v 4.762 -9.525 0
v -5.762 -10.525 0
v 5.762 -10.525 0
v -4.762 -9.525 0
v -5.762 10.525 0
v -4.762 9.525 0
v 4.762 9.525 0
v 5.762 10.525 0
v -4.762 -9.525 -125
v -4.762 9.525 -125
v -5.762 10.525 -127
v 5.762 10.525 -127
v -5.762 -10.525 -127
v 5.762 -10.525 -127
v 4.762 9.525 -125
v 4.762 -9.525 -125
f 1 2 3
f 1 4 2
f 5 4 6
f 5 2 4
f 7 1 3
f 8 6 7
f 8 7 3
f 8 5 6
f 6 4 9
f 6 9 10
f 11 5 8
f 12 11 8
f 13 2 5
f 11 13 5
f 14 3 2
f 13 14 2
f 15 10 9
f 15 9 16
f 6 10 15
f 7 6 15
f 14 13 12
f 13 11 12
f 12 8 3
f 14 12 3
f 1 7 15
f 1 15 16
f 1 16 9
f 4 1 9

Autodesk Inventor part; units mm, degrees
ref_plane "YZ Plane" through (0, 0, 0) normal (1, 0, 0) x (0, 1, 0)
ref_plane "XZ Plane" through (0, 0, 0) normal (0, 1, 0) x (-1, 0, 0)
ref_plane "XY Plane" through (0, 0, 0) normal (0, 0, 1) x (1, 0, 0)
sketch "Sketch1" plane through (0, 0, 0) normal (0, 0, 1) x (1, 0, 0)
  line L0 (5.7625, -10.525) -> (-5.7625, -10.525)
  line L1 (-5.7625, -10.525) -> (-5.7625, 10.525)
  line L2 (-5.7625, 10.525) -> (5.7625, 10.525)
  line L3 (5.7625, 10.525) -> (5.7625, -10.525)
  point P0 (0, 0)
  dimension "d2" = 21.05
  dimension "d4" = 10.525
  dimension "d7" = 11.525
  dimension "d8" = 5.7625
extrude "Extrusion1" add sketch "Sketch1" against normal blind 127
sketch "Sketch2" plane through (0, 0, 0) normal (0, 0, 1) x (1, 0, 0)
  line L0 (5.7625, -10.525) -> (-5.7625, -10.525) projected
  line L1 (5.7625, 10.525) -> (5.7625, -10.525) projected
  line L2 (-5.7625, 10.525) -> (5.7625, 10.525) projected
  line L3 (-5.7625, -10.525) -> (-5.7625, 10.525) projected
  line L4 (-4.7625, 9.525) -> (4.7625, 9.525)
  line L5 (4.7625, 9.525) -> (4.7625, -9.525)
  line L6 (4.7625, -9.525) -> (-4.7625, -9.525)
  line L7 (-4.7625, -9.525) -> (-4.7625, 9.525)
  point P0 (0, 0)
  dimension "d11" = 1
  dimension "d12" = 1
  dimension "d13" = 1
  dimension "d14" = 1
extrude "Extrusion2" cut sketch "Sketch2" against normal blind 125 contours L4 L5 L6 L7
equation "\"d2\" = 2 * d4"
equation "\"d8\" = 0.5 * d7"
equation "\"d12\" = d11"
equation "\"d13\" = d11"
equation "\"d14\" = d11"
properties part number "Waveguide Terminator"
